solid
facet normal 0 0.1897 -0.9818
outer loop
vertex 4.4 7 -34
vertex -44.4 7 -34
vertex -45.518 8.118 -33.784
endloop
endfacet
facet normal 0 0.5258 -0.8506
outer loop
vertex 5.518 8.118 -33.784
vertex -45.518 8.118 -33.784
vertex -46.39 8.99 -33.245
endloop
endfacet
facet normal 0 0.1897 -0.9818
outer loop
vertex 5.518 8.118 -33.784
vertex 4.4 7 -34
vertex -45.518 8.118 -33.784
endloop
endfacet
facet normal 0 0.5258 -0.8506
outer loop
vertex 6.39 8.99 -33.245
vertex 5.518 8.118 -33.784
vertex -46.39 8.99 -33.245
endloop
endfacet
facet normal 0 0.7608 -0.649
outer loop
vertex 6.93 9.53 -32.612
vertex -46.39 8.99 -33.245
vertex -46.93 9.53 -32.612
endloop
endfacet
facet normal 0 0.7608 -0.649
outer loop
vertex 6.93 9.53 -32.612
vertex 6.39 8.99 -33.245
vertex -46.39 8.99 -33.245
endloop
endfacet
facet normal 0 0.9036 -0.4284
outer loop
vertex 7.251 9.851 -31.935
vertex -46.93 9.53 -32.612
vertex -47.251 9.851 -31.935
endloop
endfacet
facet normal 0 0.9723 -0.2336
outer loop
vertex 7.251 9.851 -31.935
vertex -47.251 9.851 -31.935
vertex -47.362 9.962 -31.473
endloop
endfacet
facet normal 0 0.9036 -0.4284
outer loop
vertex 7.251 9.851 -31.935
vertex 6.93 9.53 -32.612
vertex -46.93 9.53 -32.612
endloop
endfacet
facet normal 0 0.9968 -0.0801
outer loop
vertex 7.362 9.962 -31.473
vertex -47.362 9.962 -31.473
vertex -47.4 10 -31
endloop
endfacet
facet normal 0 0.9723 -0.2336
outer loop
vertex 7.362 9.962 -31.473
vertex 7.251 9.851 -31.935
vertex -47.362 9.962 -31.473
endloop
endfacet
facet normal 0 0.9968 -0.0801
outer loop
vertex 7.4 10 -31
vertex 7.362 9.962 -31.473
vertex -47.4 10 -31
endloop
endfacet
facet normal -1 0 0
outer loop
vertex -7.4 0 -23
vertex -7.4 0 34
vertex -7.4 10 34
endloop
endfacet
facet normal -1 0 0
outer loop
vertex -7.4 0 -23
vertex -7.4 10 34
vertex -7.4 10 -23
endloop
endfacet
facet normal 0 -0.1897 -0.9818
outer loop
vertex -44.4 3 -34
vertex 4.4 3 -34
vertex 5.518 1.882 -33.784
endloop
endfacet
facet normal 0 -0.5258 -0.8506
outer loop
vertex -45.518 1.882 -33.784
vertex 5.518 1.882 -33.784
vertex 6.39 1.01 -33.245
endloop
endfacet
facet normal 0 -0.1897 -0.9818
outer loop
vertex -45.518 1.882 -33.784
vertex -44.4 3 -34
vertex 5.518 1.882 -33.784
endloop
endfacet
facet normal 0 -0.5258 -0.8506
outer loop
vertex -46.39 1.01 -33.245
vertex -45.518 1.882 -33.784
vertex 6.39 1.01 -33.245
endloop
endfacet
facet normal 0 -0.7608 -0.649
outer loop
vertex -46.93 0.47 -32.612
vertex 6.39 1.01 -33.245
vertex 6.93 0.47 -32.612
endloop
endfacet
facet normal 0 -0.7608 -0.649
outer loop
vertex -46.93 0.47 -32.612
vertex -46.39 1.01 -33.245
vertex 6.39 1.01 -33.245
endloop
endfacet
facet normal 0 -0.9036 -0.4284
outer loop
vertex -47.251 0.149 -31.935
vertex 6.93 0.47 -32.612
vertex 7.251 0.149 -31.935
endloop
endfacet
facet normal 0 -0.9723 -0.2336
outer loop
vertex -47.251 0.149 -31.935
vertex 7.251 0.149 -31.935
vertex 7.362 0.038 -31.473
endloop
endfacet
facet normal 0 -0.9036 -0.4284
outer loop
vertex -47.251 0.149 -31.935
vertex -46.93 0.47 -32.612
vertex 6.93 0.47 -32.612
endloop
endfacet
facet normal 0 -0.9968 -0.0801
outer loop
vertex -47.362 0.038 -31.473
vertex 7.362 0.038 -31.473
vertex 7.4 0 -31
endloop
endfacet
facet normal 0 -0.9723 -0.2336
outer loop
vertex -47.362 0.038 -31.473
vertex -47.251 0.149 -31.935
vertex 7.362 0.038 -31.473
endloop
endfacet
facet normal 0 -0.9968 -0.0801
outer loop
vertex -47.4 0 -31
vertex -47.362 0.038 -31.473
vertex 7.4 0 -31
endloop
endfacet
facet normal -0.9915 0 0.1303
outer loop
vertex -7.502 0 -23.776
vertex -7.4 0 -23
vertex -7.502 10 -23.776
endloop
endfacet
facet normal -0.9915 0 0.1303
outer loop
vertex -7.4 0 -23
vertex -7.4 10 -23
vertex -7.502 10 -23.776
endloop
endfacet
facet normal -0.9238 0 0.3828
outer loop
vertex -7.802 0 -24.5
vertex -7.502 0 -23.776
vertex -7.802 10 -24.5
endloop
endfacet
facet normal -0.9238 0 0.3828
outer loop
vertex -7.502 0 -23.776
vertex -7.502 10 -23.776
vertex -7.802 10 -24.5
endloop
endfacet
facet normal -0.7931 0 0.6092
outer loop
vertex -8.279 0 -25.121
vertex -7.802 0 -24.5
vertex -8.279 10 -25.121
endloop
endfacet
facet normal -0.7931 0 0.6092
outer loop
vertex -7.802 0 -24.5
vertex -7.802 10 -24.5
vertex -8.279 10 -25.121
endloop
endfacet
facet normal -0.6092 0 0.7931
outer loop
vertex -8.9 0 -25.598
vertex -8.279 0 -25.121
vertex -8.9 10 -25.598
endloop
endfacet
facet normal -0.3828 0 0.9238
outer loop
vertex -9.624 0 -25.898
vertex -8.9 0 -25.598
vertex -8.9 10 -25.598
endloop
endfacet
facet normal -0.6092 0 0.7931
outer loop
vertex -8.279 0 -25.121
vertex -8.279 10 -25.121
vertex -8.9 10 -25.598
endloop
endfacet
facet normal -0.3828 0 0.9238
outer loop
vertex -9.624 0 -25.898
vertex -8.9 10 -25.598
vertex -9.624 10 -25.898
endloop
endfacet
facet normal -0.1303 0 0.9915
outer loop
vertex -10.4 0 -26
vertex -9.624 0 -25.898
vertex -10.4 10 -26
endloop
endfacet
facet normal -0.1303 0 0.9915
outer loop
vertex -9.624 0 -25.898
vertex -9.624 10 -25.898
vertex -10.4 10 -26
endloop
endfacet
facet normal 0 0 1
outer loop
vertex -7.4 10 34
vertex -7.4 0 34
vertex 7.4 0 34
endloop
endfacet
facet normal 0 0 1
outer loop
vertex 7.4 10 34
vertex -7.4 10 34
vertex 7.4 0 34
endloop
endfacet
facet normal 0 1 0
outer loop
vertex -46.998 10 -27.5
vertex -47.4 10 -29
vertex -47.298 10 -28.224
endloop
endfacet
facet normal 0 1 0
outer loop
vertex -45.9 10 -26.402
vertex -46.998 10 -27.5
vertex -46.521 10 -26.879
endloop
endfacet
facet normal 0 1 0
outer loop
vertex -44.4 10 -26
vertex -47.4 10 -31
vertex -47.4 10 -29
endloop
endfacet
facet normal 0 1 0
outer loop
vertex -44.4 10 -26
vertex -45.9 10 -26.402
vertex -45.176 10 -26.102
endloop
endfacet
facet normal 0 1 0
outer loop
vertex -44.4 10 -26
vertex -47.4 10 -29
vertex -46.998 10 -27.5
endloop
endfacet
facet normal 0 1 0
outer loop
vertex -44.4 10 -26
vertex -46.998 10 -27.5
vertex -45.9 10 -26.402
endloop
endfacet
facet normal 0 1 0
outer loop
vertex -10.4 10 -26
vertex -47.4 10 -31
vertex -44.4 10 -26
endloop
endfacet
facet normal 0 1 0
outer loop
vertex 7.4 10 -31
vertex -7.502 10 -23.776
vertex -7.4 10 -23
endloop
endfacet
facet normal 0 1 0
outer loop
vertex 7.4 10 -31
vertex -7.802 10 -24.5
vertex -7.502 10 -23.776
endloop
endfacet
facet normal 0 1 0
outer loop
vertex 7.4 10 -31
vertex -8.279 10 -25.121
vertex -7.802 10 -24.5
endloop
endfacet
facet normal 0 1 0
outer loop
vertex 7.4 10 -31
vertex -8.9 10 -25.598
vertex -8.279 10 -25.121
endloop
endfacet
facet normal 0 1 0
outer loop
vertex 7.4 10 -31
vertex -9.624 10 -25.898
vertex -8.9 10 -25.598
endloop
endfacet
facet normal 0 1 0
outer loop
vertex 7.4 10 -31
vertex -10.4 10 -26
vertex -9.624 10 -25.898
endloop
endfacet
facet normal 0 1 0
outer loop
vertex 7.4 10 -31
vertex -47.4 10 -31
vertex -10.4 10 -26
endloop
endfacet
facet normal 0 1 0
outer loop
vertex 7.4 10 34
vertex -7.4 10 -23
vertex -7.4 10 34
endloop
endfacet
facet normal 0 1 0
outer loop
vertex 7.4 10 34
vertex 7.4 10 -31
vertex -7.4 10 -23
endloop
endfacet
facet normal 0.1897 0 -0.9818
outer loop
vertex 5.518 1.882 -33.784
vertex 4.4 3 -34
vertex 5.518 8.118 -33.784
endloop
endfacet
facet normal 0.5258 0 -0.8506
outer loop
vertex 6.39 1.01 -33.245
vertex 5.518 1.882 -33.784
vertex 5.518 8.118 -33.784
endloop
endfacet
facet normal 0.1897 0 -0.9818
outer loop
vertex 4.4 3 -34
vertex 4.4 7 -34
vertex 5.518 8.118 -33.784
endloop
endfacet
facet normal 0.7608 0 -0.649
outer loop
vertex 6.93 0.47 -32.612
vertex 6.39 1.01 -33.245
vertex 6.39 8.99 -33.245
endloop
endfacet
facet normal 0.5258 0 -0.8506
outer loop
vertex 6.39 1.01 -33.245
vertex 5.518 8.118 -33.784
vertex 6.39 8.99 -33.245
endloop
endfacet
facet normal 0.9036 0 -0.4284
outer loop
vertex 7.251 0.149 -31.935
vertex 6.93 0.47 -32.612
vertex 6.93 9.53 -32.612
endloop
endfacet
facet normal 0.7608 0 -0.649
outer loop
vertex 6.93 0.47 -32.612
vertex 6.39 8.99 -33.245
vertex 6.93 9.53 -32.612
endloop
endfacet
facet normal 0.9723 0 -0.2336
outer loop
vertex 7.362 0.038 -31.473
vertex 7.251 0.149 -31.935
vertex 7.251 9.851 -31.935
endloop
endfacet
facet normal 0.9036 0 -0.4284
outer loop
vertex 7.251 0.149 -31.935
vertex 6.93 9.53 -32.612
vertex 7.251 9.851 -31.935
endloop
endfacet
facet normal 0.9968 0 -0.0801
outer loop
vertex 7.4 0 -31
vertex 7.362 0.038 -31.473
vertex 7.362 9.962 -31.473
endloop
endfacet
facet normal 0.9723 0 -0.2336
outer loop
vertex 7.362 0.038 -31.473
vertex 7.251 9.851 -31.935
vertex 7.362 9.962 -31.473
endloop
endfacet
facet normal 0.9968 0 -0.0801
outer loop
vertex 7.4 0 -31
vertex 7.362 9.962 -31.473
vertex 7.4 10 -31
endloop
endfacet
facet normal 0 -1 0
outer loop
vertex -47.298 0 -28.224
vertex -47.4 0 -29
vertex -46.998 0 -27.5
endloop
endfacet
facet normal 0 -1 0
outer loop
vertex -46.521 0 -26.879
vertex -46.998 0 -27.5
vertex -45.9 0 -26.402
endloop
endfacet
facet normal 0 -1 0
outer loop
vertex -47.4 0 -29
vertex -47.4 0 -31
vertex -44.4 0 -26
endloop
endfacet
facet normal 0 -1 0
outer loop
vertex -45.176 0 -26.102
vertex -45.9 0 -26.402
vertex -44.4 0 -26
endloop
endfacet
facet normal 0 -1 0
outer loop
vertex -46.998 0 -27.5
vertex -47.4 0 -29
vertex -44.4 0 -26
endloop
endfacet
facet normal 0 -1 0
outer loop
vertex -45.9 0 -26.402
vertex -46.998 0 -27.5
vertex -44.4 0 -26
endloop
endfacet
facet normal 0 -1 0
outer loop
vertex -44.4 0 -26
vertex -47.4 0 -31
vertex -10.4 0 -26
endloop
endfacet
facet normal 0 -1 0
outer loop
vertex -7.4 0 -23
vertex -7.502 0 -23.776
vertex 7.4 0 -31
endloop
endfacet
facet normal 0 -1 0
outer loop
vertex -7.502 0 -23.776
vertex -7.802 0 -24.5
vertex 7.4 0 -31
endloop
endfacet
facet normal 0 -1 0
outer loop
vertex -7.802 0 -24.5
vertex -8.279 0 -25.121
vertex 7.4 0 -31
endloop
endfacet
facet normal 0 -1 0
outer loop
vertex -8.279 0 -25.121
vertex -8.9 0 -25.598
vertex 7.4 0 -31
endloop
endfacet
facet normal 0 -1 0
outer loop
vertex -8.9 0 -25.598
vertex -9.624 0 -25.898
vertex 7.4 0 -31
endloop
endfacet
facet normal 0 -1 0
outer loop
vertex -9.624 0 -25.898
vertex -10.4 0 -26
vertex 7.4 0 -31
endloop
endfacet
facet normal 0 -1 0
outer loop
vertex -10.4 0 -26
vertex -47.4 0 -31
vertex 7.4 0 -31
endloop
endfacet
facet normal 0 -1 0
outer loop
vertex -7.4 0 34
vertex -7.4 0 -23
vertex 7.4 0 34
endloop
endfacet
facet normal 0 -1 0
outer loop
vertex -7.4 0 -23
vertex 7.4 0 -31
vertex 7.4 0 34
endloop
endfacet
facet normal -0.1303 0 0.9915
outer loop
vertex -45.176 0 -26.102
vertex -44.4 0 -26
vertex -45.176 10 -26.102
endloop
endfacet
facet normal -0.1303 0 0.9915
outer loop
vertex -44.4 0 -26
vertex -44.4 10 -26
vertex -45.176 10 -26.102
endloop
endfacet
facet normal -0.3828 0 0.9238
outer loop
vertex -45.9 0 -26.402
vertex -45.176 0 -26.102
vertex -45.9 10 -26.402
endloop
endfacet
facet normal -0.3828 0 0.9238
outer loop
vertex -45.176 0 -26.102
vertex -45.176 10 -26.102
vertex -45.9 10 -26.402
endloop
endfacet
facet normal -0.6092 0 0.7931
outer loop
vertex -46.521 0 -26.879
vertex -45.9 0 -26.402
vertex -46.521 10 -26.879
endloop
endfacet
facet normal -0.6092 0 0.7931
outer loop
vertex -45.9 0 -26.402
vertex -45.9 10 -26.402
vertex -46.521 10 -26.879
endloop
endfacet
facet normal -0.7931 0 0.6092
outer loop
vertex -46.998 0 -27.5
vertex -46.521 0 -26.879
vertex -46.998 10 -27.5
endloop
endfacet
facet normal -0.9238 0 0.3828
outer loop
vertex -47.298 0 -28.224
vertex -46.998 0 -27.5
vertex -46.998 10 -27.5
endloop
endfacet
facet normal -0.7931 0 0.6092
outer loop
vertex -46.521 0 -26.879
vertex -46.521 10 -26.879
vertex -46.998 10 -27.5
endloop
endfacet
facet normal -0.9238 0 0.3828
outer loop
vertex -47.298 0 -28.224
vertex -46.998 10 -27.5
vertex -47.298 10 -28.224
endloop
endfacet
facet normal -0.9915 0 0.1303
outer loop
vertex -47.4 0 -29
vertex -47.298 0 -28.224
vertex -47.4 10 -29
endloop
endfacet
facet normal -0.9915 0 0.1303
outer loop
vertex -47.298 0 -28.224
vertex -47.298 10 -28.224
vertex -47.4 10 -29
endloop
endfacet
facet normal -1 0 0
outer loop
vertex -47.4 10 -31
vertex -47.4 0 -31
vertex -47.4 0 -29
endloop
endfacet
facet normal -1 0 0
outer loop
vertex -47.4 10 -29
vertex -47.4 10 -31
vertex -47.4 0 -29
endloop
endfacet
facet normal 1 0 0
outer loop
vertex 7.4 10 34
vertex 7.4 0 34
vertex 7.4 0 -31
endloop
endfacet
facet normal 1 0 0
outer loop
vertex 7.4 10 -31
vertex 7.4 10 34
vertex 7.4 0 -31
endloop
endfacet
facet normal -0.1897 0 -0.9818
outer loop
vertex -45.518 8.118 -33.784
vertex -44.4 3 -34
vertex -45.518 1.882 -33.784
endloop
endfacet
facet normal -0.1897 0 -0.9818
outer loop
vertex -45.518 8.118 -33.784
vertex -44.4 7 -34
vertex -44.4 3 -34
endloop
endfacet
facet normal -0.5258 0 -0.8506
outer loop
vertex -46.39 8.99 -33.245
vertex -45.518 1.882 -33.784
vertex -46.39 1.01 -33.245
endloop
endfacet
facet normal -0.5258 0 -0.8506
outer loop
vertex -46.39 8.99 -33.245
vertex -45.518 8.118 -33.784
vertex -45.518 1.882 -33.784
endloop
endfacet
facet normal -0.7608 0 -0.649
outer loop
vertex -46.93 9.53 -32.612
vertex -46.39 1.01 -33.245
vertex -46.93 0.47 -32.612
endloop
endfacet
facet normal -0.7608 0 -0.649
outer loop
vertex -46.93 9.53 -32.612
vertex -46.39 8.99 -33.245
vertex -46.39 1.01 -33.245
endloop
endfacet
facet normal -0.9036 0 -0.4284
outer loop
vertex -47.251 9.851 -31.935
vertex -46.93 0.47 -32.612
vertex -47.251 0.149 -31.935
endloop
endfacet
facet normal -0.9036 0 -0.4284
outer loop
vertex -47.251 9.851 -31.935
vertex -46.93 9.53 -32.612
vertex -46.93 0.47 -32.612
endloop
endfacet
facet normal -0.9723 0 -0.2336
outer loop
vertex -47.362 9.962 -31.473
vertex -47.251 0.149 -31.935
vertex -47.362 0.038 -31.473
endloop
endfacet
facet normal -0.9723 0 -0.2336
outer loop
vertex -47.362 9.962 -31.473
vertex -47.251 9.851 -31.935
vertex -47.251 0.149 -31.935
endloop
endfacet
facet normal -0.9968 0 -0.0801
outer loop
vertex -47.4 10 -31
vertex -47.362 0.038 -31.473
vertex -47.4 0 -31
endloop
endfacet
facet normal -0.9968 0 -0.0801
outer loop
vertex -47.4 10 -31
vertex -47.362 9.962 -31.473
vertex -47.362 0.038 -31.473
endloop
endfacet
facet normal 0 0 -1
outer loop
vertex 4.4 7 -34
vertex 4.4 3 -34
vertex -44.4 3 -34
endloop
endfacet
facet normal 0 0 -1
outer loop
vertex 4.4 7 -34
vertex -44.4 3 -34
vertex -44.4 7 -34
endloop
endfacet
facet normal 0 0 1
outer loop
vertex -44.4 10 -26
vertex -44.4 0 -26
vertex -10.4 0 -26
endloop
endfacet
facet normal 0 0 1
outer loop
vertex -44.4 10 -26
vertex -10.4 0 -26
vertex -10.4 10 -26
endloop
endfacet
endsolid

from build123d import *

# Parameters (mm, degrees)
SKETCH1_W           = 14.8
SKETCH1_H           = 68
BOSS_EXTRUDE1_DEPTH = 10
SKETCH2_W           = 8
SKETCH2_H           = 10
BOSS_EXTRUDE2_DEPTH = 40
FILLET2_R           = 3


with BuildPart() as part:
    # Sketch1 → Boss-Extrude1 (new body)
    with BuildSketch(Plane(origin=(0, 0, 0), x_dir=(1, 0, 0), z_dir=(0, 1, 0))):
        Rectangle(SKETCH1_W, SKETCH1_H)
    extrude(amount=BOSS_EXTRUDE1_DEPTH)

    # Sketch2 → Boss-Extrude2 (add)
    with BuildSketch(Plane.ZY.offset(7.4)):
        with Locations((-30, 5)):
            Rectangle(SKETCH2_W, SKETCH2_H)
    extrude(amount=BOSS_EXTRUDE2_DEPTH)

    # Fillet2
    fillet2_edges = [part.edges().sort_by_distance(p)[0] for p in [
        (-7.4, 5, -26),
        (-20, 10, -34),
        (-47.4, 5, -34),
        (-47.4, 5, -26),
        (-20, 0, -34),
        (7.4, 5, -34),
    ]]
    fillet(fillet2_edges, radius=FILLET2_R)


solid = part.part
